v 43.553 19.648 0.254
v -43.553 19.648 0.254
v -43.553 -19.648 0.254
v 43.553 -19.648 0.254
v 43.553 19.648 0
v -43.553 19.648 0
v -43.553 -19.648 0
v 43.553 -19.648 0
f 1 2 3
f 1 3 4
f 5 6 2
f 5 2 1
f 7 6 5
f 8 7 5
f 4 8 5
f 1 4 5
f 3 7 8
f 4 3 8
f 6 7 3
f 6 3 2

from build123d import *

# Parameters (mm, degrees)
F0_W     = 44.4375295192
F0_H     = 61.4943616092
F1_DEPTH = 2.54
F3_W     = 87.1050208807
F3_H     = 39.2954982817
F4_DEPTH = 0.254


with BuildPart() as f1:
    # F0 (on Front) → F1 (new body)
    with BuildSketch(Plane.XZ):
        with Locations((2.0198868588, 0)):
            Rectangle(F0_W, F0_H)
    extrude(amount=F1_DEPTH)


with BuildPart() as f4:
    # F3 (on Top) → F4 (new body)
    with BuildSketch(Plane.XY):
        Rectangle(F3_W, F3_H)
    extrude(amount=F4_DEPTH)


solid = f4.part
